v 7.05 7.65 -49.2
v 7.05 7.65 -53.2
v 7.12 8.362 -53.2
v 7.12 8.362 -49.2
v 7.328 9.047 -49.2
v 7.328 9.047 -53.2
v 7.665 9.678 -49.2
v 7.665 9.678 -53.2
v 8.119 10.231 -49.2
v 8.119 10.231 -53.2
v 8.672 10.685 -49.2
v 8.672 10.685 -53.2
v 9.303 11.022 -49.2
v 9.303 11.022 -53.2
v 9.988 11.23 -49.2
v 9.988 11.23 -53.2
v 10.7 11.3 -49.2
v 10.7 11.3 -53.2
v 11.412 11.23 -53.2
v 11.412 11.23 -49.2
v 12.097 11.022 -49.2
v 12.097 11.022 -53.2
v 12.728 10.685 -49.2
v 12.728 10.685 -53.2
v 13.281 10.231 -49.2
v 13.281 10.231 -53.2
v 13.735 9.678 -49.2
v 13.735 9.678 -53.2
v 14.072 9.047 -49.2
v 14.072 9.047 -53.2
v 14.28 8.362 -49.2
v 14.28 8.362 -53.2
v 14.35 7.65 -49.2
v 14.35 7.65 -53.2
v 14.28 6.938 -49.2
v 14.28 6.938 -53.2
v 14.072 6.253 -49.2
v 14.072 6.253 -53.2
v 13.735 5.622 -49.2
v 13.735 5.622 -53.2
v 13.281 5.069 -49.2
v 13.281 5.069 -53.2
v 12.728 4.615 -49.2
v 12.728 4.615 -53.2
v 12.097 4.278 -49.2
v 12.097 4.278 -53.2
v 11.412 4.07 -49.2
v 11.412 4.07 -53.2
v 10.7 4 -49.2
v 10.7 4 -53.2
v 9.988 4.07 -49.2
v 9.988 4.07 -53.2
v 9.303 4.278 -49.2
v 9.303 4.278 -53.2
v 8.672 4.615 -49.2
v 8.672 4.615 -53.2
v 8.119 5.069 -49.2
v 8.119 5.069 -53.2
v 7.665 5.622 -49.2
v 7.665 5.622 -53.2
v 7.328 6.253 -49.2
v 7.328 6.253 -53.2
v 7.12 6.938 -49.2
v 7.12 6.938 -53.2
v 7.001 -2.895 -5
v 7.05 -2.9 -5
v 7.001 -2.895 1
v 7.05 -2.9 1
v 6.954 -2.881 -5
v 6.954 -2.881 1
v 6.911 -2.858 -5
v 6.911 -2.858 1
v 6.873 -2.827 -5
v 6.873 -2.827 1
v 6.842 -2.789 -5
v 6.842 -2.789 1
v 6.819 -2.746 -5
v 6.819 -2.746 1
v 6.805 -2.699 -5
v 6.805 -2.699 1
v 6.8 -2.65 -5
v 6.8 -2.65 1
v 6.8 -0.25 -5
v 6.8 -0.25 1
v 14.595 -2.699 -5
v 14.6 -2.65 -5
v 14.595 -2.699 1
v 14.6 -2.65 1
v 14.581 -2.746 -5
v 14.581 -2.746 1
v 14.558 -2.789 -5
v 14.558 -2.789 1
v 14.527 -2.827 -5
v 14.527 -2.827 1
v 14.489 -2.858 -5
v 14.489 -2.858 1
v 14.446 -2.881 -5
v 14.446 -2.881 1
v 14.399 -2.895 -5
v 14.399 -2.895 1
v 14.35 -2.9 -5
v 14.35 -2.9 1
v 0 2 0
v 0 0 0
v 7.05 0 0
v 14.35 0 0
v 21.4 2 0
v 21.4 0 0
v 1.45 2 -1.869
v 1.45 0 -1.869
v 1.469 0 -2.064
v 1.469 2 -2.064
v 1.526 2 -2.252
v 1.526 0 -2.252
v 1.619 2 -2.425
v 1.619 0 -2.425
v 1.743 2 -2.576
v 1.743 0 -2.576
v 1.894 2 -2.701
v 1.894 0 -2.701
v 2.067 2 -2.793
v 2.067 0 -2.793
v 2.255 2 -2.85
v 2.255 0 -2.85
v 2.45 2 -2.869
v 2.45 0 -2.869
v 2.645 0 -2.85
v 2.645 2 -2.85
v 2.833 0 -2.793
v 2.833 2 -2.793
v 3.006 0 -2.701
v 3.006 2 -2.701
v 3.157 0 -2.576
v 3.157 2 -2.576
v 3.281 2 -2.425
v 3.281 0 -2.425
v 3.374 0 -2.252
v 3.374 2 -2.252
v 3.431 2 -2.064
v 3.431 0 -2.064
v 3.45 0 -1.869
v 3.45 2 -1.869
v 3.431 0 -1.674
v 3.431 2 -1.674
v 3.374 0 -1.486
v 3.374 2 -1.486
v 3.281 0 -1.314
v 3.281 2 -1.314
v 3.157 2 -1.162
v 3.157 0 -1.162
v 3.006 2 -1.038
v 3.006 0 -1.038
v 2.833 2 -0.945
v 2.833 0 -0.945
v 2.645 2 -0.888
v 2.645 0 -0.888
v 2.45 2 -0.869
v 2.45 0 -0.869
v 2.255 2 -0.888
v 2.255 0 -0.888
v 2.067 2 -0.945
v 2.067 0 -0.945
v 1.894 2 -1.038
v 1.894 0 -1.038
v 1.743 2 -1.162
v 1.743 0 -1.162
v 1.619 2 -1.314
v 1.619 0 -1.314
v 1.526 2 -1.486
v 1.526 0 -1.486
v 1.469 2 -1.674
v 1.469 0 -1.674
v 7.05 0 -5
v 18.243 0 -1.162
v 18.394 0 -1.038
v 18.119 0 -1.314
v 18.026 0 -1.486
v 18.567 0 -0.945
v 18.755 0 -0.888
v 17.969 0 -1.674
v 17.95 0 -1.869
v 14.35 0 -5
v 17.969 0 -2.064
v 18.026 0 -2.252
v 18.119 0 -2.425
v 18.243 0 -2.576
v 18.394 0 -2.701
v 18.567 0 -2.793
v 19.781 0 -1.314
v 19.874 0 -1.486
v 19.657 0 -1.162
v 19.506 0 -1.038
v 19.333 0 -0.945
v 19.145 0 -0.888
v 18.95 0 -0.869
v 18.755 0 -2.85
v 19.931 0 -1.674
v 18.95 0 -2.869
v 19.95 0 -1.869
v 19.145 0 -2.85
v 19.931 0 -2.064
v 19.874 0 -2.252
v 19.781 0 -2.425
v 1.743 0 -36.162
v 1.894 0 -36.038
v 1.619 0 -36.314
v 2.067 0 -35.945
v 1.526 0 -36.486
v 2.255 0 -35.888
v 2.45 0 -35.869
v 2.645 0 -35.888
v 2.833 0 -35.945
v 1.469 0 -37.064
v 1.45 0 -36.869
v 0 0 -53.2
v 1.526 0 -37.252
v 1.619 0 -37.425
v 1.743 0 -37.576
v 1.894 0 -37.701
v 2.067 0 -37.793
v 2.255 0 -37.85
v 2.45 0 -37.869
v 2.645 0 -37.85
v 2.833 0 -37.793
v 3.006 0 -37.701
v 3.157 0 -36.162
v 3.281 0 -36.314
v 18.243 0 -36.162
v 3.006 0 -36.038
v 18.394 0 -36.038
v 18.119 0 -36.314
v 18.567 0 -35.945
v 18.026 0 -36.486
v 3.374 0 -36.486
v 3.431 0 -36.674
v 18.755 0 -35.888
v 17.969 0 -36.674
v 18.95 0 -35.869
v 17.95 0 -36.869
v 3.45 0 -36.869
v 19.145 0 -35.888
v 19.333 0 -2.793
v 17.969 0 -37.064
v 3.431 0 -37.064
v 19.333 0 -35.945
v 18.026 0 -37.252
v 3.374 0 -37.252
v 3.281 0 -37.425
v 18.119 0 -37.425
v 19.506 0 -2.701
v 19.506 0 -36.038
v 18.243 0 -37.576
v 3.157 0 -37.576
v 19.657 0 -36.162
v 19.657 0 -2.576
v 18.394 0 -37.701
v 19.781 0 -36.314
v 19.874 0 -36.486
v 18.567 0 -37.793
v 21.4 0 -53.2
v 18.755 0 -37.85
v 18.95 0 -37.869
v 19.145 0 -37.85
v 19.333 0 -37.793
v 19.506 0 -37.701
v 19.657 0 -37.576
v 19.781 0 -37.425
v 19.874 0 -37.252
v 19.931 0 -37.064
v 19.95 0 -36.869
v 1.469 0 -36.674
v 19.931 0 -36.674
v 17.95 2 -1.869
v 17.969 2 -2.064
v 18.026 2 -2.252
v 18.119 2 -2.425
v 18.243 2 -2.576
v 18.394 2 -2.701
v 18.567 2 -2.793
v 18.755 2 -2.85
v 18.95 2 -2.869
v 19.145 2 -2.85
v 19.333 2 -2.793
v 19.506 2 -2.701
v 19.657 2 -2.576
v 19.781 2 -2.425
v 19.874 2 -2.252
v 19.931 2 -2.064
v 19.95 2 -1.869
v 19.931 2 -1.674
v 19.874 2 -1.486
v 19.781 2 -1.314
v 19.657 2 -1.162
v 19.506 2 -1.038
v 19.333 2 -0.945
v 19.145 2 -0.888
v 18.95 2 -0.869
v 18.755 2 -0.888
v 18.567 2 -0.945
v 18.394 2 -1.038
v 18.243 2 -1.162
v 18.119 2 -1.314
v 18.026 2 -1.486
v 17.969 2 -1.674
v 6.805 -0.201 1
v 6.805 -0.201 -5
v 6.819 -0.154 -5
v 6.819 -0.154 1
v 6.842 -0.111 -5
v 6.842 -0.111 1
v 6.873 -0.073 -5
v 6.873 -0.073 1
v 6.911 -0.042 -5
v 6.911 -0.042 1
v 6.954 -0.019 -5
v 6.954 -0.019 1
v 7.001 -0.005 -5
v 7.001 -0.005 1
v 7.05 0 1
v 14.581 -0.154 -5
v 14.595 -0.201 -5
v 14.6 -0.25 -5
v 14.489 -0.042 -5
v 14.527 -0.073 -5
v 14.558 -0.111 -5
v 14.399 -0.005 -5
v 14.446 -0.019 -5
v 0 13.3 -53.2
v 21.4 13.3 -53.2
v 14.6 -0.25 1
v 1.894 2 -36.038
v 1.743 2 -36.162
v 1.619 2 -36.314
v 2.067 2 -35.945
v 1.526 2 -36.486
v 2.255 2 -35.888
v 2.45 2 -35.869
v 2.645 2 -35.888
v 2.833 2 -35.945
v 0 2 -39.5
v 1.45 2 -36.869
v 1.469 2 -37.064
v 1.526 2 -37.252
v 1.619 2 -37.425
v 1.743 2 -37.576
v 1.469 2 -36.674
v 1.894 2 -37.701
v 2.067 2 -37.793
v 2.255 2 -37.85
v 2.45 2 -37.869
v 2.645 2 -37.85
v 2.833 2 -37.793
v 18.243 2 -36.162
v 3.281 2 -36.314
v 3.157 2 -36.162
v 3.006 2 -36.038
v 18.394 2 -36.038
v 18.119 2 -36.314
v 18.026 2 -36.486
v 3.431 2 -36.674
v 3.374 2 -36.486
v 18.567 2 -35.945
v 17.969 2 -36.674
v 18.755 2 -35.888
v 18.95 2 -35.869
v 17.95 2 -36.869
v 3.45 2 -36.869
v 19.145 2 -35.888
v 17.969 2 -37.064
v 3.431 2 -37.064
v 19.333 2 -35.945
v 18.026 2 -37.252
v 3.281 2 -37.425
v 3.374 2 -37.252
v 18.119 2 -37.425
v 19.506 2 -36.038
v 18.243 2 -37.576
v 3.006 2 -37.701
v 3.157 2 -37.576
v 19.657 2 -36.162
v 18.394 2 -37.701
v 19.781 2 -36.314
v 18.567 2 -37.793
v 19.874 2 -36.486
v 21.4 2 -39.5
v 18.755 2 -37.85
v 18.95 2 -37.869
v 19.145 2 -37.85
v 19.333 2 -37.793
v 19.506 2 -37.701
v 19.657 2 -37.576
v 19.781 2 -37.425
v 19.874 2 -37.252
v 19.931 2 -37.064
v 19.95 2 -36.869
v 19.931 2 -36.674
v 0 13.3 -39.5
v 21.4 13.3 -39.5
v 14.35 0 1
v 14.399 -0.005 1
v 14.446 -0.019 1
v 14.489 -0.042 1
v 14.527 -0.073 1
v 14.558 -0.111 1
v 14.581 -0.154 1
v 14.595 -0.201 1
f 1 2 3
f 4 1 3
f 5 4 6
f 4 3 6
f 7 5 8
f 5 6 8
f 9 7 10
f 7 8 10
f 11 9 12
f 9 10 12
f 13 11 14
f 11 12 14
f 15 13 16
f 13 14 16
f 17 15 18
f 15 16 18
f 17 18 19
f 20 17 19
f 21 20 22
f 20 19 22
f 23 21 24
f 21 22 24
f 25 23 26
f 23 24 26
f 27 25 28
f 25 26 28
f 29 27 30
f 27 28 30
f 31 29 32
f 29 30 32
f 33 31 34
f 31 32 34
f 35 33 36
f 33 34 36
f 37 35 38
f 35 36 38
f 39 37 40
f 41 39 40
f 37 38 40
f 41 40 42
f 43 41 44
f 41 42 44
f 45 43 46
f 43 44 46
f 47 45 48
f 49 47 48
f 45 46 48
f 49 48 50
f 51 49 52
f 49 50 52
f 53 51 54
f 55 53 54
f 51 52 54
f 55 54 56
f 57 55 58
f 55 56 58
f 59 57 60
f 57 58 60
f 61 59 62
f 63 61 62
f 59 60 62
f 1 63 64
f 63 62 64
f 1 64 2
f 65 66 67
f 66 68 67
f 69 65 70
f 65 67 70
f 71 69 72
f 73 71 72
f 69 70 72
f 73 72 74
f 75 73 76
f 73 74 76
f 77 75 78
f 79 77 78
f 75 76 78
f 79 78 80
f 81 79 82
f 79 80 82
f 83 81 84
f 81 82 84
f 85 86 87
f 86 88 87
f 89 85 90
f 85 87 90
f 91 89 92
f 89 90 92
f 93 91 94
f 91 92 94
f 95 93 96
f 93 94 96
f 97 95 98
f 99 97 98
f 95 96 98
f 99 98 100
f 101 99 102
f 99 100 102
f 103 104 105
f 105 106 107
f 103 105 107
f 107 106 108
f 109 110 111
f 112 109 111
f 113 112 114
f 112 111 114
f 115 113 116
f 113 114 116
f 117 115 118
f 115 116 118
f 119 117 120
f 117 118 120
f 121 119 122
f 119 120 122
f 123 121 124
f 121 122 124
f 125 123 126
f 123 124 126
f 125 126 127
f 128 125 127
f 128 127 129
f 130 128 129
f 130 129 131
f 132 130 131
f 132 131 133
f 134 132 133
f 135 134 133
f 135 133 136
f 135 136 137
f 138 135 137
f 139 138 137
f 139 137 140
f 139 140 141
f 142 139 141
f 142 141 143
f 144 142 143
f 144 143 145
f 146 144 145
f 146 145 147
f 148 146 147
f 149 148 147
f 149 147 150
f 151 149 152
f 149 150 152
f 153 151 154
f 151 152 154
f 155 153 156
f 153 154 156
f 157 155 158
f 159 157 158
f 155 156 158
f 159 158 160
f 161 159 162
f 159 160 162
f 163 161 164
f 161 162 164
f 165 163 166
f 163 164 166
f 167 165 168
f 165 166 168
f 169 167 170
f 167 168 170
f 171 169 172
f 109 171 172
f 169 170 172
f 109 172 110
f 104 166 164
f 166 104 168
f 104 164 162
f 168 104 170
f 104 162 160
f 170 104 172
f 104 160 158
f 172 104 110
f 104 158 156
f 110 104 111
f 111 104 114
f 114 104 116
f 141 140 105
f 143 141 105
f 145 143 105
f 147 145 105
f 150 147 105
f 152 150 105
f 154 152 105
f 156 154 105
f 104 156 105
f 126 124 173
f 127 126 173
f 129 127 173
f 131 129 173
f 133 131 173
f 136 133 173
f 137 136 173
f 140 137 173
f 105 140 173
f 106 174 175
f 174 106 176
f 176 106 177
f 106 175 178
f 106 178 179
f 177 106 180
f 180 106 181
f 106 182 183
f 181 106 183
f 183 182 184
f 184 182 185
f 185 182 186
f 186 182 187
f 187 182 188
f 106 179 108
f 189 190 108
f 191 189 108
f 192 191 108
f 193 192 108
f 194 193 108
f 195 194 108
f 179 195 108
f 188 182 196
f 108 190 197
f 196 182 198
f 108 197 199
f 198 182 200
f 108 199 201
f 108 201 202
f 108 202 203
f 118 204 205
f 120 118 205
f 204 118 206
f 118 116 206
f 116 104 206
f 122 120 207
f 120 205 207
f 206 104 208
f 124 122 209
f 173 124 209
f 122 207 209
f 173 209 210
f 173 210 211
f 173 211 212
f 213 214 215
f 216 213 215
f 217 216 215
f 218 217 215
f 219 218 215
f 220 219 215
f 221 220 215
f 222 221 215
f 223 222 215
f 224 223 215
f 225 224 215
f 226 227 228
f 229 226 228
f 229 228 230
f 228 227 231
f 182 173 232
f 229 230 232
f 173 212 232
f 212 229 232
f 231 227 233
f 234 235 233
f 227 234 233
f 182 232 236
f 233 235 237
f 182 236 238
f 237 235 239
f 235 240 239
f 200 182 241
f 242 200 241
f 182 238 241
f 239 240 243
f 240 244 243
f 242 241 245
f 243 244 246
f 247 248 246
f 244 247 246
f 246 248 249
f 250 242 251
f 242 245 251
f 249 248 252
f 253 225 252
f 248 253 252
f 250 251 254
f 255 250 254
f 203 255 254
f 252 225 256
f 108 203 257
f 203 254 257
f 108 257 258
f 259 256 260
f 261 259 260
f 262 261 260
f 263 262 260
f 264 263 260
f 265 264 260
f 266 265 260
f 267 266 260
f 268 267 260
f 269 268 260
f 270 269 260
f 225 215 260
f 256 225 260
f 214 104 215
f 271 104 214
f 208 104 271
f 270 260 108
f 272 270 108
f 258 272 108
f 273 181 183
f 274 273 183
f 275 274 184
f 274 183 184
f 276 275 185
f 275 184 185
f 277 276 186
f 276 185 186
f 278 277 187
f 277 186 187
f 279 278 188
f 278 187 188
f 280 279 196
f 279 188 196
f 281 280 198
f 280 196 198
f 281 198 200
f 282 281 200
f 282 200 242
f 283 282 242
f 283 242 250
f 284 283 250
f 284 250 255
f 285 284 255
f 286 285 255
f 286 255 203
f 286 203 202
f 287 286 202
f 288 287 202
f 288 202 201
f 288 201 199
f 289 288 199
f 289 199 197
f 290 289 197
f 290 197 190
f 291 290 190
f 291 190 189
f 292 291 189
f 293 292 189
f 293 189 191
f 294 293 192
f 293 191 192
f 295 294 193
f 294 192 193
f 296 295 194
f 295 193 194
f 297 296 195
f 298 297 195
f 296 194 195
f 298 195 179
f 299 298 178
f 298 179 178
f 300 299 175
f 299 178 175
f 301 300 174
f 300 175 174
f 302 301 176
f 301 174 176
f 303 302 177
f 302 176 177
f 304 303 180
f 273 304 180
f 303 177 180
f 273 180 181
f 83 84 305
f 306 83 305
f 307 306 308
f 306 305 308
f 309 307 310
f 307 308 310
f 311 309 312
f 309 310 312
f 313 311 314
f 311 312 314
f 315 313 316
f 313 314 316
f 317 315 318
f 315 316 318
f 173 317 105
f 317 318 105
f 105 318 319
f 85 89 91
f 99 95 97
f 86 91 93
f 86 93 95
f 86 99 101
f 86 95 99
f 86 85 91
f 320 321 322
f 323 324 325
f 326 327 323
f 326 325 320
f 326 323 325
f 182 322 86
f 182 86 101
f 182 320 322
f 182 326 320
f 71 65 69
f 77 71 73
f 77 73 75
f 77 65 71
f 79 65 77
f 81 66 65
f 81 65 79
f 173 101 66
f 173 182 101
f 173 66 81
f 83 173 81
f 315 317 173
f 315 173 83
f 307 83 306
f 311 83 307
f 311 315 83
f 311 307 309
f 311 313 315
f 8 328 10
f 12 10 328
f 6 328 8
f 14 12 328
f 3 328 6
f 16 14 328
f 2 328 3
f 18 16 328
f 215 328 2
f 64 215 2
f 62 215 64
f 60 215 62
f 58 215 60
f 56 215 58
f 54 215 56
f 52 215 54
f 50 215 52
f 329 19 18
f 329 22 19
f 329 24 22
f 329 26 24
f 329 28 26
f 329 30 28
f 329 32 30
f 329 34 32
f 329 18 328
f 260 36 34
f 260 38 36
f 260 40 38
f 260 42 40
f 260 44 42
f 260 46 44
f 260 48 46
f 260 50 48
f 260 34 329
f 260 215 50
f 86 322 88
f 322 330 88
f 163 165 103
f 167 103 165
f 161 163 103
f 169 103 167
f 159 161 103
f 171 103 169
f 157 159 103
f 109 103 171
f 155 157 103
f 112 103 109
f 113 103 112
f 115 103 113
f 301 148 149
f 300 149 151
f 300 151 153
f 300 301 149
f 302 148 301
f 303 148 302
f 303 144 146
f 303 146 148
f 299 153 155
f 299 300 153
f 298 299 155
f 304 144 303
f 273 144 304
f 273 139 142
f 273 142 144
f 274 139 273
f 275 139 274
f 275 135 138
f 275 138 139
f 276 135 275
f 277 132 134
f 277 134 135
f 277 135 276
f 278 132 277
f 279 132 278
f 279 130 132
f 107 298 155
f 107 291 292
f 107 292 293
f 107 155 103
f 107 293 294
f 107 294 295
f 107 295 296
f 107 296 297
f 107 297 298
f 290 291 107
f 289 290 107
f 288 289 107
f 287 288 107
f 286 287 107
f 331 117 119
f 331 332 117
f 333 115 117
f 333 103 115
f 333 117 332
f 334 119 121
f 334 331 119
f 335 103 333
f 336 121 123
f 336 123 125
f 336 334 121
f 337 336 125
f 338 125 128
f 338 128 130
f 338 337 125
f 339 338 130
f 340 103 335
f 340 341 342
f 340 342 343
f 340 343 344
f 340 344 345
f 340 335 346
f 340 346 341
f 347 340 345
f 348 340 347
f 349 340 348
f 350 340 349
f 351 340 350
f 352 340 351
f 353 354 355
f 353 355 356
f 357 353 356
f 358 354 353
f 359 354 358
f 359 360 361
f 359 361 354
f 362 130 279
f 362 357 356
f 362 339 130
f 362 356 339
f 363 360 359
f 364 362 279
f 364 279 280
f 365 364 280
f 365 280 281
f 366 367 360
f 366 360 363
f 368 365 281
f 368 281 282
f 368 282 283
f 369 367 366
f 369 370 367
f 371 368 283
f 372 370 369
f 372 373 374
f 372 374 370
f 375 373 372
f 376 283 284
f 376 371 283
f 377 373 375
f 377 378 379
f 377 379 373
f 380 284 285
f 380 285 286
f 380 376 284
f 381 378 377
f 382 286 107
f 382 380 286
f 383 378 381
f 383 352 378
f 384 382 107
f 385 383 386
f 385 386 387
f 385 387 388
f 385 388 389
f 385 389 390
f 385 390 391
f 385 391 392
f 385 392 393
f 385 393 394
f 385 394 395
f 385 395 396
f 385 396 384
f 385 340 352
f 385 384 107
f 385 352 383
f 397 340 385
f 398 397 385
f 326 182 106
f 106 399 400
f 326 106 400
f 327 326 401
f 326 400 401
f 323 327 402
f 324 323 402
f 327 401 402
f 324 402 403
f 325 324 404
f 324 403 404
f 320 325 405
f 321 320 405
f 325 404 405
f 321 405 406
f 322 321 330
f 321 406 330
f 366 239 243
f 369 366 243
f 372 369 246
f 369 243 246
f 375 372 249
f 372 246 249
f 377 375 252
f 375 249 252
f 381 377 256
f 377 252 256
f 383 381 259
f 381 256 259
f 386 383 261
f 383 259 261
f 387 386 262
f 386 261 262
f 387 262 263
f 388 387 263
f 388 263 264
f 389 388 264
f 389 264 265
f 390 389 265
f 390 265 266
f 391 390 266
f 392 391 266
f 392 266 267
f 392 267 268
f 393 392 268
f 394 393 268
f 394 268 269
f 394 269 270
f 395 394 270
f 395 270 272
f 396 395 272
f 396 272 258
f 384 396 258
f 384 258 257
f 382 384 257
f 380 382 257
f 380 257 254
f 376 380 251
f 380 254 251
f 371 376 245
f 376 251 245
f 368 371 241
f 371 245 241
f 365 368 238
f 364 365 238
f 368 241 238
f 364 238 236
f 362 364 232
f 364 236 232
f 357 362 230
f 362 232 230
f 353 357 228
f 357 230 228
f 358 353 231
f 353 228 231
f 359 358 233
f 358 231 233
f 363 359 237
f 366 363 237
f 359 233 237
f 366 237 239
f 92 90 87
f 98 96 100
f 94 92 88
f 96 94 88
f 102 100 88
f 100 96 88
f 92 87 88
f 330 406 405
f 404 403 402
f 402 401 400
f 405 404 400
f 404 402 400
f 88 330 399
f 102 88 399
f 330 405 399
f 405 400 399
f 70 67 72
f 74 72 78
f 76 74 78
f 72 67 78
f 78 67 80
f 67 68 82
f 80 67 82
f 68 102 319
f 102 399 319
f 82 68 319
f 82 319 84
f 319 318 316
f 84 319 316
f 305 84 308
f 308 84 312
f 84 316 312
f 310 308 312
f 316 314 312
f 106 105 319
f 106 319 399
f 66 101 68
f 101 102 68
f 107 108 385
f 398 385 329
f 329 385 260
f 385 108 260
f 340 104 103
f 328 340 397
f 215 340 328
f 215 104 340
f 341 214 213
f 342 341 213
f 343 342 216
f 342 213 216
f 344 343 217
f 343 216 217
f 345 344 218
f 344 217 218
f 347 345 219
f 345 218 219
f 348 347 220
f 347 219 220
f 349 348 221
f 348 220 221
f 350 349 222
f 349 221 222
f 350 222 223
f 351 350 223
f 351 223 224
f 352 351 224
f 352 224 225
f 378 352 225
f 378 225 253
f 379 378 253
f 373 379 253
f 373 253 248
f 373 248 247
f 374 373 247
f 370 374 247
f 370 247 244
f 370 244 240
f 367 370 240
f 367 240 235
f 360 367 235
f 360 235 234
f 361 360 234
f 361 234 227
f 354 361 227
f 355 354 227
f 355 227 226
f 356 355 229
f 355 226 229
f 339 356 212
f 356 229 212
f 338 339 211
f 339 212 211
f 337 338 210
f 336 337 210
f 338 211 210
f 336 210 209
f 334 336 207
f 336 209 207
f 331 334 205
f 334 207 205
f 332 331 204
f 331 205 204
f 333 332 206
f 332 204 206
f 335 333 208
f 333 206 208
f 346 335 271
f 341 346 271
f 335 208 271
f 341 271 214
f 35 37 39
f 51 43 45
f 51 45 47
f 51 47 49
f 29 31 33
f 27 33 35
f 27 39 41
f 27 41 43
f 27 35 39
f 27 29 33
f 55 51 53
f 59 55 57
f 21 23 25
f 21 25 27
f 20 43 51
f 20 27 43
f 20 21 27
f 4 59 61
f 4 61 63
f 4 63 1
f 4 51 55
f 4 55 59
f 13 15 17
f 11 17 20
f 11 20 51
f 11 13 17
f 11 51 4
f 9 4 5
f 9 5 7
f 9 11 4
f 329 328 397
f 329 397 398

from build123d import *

# Parameters (mm, degrees)
SKETCH1_W             = 21.4
SKETCH1_H             = 53.2
BOSS_EXTRUDE1_DEPTH   = 2
SKETCH2_W             = 21.4
SKETCH2_H             = 13.7
BOSS_EXTRUDE2_DEPTH   = 11.3
SKETCH3_R             = 3.65
CUT_EXTRUDE1_DEPTH    = 4
F_2_0MM_DOWEL_HOLE1_D = 2
BOSS_EXTRUDE3_DEPTH   = 1
BOSS_EXTRUDE4_DEPTH   = 5


with BuildPart() as part:
    # Sketch1 → Boss-Extrude1 (new body)
    with BuildSketch(Plane(origin=(0, 0, 0), x_dir=(1, 0, 0), z_dir=(0, 1, 0))):
        with Locations((10.7, 26.6)):
            Rectangle(SKETCH1_W, SKETCH1_H)
    extrude(amount=BOSS_EXTRUDE1_DEPTH)

    # Sketch2 → Boss-Extrude2 (add)
    with BuildSketch(Plane(origin=(0, 2, 0), x_dir=(1, 0, 0), z_dir=(0, 1, 0))):
        with Locations((10.7, 46.35)):
            Rectangle(SKETCH2_W, SKETCH2_H)
    extrude(amount=BOSS_EXTRUDE2_DEPTH)

    # Sketch3 → Cut-Extrude1 (cut)
    with BuildSketch(Plane(origin=(0, 0, -53.2), x_dir=(-1, 0, 0), z_dir=(0, 0, -1))):
        with Locations((-10.7, 7.65)):
            Circle(SKETCH3_R)
    extrude(amount=-CUT_EXTRUDE1_DEPTH, mode=Mode.SUBTRACT)

    # Ø2.0mm Dowel Hole1 (through all)
    with Locations(Plane(origin=(0, 2, 0), x_dir=(1, 0, 0), z_dir=(0, 1, 0))):
        with Locations((2.45, 36.869115366), (18.95, 36.869115366), (18.95, 1.869115366), (2.45, 1.869115366)):
            Hole(F_2_0MM_DOWEL_HOLE1_D / 2)



with BuildPart() as body_2:
    # Sketch10 → Boss-Extrude3 (new body)
    with BuildSketch(Plane.XY):
        with BuildLine():
            Line((7.05, 0), (14.35, 0))
            ThreePointArc((14.35, 0), (14.526776695, -0.073223305), (14.6, -0.25))
            Line((14.6, -0.25), (14.6, -2.65))
            ThreePointArc((14.6, -2.65), (14.526776695, -2.826776695), (14.35, -2.9))
            Line((14.35, -2.9), (7.05, -2.9))
            ThreePointArc((7.05, -2.9), (6.873223305, -2.826776695), (6.8, -2.65))
            Line((6.8, -2.65), (6.8, -0.25))
            ThreePointArc((6.8, -0.25), (6.873223305, -0.073223305), (7.05, 0))
        make_face()
    extrude(amount=BOSS_EXTRUDE3_DEPTH)


with BuildPart() as part_1:
    add(part.part)

    add(body_2.part)  # Boss-Extrude4 merges body 2
    # Sketch10<2> → Boss-Extrude4 (add)
    with BuildSketch(Plane.XY):
        with BuildLine():
            Line((7.05, 0), (14.35, 0))
            ThreePointArc((14.35, 0), (14.526776695, -0.073223305), (14.6, -0.25))
            Line((14.6, -0.25), (14.6, -2.65))
            ThreePointArc((14.6, -2.65), (14.526776695, -2.826776695), (14.35, -2.9))
            Line((14.35, -2.9), (7.05, -2.9))
            ThreePointArc((7.05, -2.9), (6.873223305, -2.826776695), (6.8, -2.65))
            Line((6.8, -2.65), (6.8, -0.25))
            ThreePointArc((6.8, -0.25), (6.873223305, -0.073223305), (7.05, 0))
        make_face()
    extrude(amount=-BOSS_EXTRUDE4_DEPTH)


solid = part_1.part
